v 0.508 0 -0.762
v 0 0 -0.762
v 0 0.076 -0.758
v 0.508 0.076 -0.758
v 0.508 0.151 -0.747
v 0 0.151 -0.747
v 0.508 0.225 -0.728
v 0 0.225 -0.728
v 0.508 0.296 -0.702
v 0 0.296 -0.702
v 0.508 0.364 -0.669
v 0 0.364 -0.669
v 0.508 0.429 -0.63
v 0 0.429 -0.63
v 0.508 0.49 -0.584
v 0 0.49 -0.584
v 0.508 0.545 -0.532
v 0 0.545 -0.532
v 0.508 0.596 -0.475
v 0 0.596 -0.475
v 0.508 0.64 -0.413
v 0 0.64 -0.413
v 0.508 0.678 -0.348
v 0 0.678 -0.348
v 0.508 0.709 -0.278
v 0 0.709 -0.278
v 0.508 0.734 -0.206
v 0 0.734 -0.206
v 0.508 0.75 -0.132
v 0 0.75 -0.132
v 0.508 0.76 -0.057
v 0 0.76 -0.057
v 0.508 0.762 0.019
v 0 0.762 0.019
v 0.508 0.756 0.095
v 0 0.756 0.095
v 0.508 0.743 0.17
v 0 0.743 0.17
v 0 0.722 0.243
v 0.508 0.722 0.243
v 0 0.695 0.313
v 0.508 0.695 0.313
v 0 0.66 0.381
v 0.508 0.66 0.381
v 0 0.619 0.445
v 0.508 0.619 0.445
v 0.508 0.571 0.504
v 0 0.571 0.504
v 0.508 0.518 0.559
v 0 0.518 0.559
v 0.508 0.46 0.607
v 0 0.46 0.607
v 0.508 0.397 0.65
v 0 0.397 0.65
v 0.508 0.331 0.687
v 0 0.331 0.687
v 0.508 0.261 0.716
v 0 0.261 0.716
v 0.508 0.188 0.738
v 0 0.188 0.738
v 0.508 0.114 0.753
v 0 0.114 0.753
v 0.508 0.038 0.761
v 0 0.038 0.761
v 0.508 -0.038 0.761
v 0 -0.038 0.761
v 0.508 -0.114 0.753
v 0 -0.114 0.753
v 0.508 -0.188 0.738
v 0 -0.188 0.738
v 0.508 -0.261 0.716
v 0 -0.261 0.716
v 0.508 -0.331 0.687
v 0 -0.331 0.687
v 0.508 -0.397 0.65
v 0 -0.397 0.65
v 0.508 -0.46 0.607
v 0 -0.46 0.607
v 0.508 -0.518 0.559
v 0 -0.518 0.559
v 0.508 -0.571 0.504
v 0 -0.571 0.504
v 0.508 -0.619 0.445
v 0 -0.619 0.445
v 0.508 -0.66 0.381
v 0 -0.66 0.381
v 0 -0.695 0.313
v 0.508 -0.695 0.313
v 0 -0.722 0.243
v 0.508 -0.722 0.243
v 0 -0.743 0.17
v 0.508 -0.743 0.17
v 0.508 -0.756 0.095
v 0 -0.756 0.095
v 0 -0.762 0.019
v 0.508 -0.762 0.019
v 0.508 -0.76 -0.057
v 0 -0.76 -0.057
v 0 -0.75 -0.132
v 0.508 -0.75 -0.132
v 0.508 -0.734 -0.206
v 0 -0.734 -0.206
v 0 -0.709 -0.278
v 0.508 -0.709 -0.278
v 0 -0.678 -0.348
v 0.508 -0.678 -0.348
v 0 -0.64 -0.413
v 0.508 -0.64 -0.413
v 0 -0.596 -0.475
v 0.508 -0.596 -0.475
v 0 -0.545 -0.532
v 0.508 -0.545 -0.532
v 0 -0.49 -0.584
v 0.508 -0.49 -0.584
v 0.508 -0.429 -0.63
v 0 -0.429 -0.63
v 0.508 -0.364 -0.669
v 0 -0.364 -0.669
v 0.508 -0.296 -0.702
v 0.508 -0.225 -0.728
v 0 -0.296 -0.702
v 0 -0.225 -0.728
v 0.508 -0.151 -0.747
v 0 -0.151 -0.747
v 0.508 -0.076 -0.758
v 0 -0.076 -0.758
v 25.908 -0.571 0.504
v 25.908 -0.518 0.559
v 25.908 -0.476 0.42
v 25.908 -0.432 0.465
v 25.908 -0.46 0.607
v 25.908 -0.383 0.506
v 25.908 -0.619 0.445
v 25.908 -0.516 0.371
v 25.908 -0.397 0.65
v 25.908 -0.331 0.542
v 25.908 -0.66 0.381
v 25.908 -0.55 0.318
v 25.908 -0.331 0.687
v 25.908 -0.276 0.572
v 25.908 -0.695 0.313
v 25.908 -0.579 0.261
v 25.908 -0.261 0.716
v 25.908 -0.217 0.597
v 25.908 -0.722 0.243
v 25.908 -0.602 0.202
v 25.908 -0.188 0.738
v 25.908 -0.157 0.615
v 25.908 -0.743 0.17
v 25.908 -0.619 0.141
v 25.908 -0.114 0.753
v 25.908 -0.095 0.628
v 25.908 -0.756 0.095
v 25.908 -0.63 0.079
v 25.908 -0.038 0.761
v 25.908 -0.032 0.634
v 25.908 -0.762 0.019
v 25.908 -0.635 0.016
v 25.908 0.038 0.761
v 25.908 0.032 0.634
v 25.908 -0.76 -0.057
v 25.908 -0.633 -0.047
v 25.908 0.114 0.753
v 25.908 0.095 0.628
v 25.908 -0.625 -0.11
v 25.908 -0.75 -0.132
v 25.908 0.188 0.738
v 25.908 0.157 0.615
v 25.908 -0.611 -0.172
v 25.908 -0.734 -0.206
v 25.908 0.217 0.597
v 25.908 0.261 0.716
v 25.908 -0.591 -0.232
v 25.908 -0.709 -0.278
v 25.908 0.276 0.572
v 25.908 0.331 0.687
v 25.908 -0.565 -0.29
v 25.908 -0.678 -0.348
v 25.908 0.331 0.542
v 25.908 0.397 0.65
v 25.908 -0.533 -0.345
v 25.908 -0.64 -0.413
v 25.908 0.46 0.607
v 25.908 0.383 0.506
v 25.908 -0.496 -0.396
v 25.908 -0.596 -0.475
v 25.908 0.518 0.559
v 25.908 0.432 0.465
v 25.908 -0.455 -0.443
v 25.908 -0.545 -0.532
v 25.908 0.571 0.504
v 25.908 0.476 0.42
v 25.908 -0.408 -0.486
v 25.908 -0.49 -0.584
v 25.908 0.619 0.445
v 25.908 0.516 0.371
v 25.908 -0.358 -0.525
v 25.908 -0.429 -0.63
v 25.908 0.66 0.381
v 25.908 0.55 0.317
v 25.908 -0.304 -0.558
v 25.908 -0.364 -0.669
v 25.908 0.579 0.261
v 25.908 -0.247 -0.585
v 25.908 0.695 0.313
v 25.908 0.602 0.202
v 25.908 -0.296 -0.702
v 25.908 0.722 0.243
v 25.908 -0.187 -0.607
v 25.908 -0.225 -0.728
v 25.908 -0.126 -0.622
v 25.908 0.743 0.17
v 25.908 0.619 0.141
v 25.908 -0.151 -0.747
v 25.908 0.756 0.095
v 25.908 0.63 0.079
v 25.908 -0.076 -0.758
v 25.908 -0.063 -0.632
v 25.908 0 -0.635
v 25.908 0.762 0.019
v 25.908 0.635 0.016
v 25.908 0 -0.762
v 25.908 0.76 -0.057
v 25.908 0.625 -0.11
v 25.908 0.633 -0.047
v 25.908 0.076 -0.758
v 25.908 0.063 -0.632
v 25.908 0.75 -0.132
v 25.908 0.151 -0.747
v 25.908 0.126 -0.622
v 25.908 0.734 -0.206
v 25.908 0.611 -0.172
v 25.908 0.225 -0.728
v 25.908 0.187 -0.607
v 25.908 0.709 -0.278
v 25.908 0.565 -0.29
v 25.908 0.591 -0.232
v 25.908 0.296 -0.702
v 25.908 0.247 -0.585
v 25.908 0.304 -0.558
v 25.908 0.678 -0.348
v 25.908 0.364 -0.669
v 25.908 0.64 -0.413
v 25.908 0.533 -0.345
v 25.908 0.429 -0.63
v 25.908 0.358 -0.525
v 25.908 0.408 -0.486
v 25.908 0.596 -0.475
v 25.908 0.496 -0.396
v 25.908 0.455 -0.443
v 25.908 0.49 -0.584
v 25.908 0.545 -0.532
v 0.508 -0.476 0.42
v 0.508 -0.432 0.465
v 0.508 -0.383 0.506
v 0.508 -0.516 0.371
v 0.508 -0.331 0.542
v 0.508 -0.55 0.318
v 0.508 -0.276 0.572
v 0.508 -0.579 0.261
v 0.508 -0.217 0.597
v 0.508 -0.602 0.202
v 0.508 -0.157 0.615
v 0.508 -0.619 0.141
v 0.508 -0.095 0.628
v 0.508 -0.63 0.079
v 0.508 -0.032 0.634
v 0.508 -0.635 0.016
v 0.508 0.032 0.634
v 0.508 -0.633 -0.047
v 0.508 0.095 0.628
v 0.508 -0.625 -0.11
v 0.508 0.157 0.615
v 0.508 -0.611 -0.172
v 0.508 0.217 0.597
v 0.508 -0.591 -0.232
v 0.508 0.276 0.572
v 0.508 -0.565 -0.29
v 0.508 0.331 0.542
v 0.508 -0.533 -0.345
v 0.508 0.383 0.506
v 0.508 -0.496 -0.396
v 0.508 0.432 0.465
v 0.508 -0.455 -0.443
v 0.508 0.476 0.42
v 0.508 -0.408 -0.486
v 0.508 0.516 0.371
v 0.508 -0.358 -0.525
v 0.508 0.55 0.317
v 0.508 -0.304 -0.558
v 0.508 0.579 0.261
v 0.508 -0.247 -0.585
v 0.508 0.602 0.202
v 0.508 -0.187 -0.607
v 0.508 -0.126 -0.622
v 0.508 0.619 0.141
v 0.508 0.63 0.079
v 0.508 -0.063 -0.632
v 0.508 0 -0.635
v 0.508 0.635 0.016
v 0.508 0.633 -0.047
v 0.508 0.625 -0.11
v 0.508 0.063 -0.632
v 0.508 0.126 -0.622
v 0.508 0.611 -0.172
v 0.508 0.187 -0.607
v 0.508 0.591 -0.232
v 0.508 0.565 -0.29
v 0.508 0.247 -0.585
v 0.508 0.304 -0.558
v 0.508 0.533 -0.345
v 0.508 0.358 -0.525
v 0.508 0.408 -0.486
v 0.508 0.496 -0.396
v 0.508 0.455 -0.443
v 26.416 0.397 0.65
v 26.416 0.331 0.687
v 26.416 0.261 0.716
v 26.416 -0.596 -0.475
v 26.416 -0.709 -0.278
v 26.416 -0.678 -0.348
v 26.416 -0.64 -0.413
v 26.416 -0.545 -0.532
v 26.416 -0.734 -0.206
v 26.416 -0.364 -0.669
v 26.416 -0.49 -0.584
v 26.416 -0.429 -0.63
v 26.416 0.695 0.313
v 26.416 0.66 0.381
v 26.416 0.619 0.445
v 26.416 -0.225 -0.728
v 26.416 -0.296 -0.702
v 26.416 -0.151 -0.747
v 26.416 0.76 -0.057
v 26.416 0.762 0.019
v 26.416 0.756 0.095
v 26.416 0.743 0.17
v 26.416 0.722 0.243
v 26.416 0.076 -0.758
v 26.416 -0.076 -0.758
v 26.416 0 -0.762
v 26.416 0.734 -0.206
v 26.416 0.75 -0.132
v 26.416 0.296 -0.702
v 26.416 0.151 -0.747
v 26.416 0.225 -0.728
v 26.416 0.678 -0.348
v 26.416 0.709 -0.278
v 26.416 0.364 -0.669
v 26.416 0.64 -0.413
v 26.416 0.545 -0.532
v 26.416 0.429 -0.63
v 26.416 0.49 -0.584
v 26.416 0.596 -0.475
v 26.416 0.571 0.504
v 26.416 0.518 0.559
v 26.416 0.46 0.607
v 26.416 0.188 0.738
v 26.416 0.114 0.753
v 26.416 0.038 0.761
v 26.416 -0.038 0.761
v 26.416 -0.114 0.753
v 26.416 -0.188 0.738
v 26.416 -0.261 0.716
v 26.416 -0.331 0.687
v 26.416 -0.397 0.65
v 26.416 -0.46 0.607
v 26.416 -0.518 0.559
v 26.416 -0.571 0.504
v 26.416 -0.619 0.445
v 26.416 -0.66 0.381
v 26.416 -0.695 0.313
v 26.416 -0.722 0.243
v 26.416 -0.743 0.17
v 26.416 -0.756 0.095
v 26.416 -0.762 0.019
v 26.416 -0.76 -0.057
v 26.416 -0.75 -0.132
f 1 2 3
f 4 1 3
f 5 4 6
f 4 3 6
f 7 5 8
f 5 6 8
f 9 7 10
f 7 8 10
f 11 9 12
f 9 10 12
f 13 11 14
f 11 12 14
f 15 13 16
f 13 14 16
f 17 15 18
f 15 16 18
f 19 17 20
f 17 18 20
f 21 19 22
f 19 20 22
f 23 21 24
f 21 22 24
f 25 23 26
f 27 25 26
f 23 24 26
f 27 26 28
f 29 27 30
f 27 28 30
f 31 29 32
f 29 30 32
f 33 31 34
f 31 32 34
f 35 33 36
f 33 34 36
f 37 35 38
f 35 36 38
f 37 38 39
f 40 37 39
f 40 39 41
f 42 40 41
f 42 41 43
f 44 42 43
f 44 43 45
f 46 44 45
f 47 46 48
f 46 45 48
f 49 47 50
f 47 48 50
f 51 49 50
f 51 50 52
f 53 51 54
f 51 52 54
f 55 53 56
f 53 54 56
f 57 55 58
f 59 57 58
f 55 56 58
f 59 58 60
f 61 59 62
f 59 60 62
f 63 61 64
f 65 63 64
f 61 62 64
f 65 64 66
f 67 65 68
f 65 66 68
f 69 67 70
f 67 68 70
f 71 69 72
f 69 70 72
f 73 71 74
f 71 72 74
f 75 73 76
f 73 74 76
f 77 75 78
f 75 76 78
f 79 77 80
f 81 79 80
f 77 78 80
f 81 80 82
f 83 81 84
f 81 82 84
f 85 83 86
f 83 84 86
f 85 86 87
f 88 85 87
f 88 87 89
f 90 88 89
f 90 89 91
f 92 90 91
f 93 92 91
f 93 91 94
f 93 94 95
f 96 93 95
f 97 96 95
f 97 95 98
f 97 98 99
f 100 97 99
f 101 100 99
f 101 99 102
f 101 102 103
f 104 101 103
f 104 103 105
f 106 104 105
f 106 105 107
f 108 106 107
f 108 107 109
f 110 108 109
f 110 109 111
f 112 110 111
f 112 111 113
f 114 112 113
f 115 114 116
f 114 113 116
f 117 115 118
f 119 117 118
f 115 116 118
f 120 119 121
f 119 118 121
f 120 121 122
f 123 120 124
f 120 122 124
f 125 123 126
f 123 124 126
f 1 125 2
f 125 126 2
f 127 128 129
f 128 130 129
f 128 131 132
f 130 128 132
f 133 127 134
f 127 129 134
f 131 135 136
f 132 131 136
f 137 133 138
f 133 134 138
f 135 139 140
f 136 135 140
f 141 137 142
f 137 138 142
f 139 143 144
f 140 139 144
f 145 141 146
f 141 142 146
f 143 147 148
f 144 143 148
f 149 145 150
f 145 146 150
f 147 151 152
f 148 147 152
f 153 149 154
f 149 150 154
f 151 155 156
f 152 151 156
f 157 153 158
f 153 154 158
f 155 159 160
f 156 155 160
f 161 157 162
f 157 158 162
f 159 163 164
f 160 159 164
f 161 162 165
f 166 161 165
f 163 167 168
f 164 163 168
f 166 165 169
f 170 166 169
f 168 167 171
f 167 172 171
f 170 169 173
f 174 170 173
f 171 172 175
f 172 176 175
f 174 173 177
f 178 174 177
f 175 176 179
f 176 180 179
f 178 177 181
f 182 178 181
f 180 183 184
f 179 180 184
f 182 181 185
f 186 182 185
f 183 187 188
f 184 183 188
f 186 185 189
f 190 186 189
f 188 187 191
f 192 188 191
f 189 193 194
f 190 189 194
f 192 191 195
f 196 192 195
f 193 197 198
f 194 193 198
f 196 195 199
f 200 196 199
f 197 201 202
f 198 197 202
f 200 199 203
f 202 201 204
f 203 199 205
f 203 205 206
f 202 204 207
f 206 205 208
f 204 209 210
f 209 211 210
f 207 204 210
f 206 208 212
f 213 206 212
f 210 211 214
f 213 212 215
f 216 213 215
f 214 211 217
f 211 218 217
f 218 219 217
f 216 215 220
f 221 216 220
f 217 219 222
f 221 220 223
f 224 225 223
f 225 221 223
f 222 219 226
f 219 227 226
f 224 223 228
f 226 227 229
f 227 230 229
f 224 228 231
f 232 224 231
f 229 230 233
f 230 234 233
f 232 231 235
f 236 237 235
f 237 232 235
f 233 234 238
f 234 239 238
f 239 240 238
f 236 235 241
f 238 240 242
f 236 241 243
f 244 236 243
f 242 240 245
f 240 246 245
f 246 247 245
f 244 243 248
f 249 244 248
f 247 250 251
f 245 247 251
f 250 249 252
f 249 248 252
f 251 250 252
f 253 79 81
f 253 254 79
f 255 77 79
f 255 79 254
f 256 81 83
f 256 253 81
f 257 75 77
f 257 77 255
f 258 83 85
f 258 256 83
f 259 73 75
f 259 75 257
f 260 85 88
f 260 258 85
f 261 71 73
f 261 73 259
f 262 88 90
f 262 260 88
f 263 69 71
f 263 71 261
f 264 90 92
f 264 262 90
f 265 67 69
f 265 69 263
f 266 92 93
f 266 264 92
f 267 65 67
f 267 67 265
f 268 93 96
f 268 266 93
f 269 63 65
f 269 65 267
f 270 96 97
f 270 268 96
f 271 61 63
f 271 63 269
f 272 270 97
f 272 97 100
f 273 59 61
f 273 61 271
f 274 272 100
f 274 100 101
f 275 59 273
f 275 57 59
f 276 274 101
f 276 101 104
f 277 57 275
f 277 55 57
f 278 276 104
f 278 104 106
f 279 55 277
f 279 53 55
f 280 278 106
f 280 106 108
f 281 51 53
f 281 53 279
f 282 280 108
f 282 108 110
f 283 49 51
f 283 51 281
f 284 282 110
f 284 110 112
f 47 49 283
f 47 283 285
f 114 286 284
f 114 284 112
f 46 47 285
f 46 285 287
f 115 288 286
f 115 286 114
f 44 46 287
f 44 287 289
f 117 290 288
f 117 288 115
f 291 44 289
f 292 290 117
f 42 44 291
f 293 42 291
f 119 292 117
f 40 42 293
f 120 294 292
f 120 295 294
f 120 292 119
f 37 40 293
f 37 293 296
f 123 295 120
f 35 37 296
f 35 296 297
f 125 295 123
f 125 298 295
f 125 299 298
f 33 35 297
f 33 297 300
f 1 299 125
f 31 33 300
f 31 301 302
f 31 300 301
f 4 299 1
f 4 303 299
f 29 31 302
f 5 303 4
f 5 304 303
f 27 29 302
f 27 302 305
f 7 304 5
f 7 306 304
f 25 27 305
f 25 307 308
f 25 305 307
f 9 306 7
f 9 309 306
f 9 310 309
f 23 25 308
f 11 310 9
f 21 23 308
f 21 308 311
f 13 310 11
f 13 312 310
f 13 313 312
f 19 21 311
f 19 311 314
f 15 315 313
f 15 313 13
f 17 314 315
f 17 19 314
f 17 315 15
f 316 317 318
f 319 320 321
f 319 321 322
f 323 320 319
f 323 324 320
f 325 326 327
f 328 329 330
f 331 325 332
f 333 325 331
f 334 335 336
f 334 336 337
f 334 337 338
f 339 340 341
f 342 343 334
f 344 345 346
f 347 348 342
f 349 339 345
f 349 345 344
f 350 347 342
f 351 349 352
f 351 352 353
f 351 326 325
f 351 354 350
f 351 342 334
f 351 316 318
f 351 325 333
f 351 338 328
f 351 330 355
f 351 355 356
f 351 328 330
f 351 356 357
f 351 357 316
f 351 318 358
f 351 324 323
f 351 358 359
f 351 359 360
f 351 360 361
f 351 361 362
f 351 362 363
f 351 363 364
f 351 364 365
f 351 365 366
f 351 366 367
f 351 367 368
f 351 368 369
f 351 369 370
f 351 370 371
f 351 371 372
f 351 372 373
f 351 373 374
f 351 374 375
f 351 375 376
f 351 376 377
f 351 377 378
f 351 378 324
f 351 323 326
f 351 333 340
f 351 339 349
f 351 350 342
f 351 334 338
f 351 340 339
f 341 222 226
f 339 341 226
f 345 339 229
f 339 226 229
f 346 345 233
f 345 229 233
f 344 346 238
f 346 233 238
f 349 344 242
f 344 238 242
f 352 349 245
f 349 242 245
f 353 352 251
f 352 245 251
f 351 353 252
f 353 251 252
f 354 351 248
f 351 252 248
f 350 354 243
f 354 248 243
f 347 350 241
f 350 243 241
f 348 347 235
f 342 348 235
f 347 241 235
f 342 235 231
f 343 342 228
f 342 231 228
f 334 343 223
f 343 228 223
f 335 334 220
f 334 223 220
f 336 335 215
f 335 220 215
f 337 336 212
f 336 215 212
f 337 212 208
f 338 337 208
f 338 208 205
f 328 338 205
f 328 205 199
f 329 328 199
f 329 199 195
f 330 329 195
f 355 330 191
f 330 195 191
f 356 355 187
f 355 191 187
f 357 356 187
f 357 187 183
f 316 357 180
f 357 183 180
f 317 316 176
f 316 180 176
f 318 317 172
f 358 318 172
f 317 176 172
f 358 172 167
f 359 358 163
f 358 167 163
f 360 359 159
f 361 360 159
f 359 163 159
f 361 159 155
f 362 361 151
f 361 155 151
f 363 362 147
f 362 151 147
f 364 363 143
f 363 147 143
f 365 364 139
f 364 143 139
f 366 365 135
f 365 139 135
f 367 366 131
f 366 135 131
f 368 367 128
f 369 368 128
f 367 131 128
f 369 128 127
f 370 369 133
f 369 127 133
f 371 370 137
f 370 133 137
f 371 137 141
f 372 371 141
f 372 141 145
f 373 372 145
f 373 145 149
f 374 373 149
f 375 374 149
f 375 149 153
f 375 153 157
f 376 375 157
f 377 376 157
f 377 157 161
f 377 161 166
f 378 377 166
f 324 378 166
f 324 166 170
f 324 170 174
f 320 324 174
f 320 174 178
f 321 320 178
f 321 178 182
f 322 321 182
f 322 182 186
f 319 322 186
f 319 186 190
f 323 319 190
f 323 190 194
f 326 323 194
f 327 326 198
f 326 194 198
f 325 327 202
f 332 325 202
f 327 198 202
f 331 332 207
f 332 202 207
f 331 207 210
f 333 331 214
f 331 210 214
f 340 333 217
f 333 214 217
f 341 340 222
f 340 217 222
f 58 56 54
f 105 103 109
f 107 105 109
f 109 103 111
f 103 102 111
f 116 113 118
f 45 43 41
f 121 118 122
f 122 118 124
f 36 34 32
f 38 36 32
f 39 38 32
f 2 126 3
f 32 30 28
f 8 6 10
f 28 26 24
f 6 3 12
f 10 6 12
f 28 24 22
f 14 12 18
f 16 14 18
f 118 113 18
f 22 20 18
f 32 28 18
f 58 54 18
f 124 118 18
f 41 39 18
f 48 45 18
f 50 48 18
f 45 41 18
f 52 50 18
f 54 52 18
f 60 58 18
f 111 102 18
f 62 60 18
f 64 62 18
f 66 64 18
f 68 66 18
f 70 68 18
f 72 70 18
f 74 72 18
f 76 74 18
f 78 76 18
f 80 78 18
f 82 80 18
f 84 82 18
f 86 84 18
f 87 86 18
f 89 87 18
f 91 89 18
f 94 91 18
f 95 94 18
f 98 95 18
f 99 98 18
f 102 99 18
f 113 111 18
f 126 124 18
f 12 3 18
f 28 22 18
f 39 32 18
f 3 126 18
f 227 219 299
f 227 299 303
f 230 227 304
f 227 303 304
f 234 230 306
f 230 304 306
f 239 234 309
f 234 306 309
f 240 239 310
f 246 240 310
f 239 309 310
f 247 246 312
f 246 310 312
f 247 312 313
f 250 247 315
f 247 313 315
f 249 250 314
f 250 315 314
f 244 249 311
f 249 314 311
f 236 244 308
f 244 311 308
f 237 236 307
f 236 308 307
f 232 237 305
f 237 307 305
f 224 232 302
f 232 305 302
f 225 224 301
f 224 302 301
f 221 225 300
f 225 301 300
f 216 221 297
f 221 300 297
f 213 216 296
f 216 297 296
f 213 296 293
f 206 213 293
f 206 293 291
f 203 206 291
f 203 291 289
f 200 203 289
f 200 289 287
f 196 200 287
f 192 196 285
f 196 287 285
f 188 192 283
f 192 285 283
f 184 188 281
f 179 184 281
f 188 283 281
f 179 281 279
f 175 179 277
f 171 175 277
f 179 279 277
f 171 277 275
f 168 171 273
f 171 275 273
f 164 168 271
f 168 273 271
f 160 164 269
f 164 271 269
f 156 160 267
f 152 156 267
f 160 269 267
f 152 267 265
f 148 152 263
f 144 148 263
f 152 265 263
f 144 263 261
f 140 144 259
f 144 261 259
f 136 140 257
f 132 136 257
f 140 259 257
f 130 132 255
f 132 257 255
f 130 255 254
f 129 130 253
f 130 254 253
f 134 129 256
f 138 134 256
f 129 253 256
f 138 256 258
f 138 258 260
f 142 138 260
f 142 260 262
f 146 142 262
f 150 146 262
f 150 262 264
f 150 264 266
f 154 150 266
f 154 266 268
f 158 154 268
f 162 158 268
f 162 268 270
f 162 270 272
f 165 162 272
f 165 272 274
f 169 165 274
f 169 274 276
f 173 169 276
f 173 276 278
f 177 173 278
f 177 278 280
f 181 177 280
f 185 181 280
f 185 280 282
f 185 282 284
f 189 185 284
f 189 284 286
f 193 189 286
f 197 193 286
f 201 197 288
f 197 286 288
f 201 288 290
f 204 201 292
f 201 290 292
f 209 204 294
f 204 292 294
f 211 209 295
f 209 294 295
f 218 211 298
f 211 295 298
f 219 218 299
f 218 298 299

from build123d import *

# Parameters (mm, degrees)
SKETCH1_R           = 0.762
BOSS_EXTRUDE1_DEPTH = 0.508
SKETCH2_R           = 0.635
BOSS_EXTRUDE2_DEPTH = 25.4
SKETCH3_R           = 0.762
BOSS_EXTRUDE3_DEPTH = 0.508


with BuildPart() as part:
    # Sketch1 → Boss-Extrude1 (new body)
    with BuildSketch(Plane(origin=(0, 0, 0), x_dir=(0, 0, -1), z_dir=(1, 0, 0))):
        Circle(SKETCH1_R)
    extrude(amount=BOSS_EXTRUDE1_DEPTH)

    # Sketch2 → Boss-Extrude2 (add)
    with BuildSketch(Plane(origin=(0.508, 0, 0), x_dir=(0, 0, -1), z_dir=(1, 0, 0))):
        Circle(SKETCH2_R)
    extrude(amount=BOSS_EXTRUDE2_DEPTH)

    # Sketch3 → Boss-Extrude3 (add)
    with BuildSketch(Plane(origin=(25.908, 0, 0), x_dir=(0, 0, -1), z_dir=(1, 0, 0))):
        Circle(SKETCH3_R)
    extrude(amount=BOSS_EXTRUDE3_DEPTH)


solid = part.part
